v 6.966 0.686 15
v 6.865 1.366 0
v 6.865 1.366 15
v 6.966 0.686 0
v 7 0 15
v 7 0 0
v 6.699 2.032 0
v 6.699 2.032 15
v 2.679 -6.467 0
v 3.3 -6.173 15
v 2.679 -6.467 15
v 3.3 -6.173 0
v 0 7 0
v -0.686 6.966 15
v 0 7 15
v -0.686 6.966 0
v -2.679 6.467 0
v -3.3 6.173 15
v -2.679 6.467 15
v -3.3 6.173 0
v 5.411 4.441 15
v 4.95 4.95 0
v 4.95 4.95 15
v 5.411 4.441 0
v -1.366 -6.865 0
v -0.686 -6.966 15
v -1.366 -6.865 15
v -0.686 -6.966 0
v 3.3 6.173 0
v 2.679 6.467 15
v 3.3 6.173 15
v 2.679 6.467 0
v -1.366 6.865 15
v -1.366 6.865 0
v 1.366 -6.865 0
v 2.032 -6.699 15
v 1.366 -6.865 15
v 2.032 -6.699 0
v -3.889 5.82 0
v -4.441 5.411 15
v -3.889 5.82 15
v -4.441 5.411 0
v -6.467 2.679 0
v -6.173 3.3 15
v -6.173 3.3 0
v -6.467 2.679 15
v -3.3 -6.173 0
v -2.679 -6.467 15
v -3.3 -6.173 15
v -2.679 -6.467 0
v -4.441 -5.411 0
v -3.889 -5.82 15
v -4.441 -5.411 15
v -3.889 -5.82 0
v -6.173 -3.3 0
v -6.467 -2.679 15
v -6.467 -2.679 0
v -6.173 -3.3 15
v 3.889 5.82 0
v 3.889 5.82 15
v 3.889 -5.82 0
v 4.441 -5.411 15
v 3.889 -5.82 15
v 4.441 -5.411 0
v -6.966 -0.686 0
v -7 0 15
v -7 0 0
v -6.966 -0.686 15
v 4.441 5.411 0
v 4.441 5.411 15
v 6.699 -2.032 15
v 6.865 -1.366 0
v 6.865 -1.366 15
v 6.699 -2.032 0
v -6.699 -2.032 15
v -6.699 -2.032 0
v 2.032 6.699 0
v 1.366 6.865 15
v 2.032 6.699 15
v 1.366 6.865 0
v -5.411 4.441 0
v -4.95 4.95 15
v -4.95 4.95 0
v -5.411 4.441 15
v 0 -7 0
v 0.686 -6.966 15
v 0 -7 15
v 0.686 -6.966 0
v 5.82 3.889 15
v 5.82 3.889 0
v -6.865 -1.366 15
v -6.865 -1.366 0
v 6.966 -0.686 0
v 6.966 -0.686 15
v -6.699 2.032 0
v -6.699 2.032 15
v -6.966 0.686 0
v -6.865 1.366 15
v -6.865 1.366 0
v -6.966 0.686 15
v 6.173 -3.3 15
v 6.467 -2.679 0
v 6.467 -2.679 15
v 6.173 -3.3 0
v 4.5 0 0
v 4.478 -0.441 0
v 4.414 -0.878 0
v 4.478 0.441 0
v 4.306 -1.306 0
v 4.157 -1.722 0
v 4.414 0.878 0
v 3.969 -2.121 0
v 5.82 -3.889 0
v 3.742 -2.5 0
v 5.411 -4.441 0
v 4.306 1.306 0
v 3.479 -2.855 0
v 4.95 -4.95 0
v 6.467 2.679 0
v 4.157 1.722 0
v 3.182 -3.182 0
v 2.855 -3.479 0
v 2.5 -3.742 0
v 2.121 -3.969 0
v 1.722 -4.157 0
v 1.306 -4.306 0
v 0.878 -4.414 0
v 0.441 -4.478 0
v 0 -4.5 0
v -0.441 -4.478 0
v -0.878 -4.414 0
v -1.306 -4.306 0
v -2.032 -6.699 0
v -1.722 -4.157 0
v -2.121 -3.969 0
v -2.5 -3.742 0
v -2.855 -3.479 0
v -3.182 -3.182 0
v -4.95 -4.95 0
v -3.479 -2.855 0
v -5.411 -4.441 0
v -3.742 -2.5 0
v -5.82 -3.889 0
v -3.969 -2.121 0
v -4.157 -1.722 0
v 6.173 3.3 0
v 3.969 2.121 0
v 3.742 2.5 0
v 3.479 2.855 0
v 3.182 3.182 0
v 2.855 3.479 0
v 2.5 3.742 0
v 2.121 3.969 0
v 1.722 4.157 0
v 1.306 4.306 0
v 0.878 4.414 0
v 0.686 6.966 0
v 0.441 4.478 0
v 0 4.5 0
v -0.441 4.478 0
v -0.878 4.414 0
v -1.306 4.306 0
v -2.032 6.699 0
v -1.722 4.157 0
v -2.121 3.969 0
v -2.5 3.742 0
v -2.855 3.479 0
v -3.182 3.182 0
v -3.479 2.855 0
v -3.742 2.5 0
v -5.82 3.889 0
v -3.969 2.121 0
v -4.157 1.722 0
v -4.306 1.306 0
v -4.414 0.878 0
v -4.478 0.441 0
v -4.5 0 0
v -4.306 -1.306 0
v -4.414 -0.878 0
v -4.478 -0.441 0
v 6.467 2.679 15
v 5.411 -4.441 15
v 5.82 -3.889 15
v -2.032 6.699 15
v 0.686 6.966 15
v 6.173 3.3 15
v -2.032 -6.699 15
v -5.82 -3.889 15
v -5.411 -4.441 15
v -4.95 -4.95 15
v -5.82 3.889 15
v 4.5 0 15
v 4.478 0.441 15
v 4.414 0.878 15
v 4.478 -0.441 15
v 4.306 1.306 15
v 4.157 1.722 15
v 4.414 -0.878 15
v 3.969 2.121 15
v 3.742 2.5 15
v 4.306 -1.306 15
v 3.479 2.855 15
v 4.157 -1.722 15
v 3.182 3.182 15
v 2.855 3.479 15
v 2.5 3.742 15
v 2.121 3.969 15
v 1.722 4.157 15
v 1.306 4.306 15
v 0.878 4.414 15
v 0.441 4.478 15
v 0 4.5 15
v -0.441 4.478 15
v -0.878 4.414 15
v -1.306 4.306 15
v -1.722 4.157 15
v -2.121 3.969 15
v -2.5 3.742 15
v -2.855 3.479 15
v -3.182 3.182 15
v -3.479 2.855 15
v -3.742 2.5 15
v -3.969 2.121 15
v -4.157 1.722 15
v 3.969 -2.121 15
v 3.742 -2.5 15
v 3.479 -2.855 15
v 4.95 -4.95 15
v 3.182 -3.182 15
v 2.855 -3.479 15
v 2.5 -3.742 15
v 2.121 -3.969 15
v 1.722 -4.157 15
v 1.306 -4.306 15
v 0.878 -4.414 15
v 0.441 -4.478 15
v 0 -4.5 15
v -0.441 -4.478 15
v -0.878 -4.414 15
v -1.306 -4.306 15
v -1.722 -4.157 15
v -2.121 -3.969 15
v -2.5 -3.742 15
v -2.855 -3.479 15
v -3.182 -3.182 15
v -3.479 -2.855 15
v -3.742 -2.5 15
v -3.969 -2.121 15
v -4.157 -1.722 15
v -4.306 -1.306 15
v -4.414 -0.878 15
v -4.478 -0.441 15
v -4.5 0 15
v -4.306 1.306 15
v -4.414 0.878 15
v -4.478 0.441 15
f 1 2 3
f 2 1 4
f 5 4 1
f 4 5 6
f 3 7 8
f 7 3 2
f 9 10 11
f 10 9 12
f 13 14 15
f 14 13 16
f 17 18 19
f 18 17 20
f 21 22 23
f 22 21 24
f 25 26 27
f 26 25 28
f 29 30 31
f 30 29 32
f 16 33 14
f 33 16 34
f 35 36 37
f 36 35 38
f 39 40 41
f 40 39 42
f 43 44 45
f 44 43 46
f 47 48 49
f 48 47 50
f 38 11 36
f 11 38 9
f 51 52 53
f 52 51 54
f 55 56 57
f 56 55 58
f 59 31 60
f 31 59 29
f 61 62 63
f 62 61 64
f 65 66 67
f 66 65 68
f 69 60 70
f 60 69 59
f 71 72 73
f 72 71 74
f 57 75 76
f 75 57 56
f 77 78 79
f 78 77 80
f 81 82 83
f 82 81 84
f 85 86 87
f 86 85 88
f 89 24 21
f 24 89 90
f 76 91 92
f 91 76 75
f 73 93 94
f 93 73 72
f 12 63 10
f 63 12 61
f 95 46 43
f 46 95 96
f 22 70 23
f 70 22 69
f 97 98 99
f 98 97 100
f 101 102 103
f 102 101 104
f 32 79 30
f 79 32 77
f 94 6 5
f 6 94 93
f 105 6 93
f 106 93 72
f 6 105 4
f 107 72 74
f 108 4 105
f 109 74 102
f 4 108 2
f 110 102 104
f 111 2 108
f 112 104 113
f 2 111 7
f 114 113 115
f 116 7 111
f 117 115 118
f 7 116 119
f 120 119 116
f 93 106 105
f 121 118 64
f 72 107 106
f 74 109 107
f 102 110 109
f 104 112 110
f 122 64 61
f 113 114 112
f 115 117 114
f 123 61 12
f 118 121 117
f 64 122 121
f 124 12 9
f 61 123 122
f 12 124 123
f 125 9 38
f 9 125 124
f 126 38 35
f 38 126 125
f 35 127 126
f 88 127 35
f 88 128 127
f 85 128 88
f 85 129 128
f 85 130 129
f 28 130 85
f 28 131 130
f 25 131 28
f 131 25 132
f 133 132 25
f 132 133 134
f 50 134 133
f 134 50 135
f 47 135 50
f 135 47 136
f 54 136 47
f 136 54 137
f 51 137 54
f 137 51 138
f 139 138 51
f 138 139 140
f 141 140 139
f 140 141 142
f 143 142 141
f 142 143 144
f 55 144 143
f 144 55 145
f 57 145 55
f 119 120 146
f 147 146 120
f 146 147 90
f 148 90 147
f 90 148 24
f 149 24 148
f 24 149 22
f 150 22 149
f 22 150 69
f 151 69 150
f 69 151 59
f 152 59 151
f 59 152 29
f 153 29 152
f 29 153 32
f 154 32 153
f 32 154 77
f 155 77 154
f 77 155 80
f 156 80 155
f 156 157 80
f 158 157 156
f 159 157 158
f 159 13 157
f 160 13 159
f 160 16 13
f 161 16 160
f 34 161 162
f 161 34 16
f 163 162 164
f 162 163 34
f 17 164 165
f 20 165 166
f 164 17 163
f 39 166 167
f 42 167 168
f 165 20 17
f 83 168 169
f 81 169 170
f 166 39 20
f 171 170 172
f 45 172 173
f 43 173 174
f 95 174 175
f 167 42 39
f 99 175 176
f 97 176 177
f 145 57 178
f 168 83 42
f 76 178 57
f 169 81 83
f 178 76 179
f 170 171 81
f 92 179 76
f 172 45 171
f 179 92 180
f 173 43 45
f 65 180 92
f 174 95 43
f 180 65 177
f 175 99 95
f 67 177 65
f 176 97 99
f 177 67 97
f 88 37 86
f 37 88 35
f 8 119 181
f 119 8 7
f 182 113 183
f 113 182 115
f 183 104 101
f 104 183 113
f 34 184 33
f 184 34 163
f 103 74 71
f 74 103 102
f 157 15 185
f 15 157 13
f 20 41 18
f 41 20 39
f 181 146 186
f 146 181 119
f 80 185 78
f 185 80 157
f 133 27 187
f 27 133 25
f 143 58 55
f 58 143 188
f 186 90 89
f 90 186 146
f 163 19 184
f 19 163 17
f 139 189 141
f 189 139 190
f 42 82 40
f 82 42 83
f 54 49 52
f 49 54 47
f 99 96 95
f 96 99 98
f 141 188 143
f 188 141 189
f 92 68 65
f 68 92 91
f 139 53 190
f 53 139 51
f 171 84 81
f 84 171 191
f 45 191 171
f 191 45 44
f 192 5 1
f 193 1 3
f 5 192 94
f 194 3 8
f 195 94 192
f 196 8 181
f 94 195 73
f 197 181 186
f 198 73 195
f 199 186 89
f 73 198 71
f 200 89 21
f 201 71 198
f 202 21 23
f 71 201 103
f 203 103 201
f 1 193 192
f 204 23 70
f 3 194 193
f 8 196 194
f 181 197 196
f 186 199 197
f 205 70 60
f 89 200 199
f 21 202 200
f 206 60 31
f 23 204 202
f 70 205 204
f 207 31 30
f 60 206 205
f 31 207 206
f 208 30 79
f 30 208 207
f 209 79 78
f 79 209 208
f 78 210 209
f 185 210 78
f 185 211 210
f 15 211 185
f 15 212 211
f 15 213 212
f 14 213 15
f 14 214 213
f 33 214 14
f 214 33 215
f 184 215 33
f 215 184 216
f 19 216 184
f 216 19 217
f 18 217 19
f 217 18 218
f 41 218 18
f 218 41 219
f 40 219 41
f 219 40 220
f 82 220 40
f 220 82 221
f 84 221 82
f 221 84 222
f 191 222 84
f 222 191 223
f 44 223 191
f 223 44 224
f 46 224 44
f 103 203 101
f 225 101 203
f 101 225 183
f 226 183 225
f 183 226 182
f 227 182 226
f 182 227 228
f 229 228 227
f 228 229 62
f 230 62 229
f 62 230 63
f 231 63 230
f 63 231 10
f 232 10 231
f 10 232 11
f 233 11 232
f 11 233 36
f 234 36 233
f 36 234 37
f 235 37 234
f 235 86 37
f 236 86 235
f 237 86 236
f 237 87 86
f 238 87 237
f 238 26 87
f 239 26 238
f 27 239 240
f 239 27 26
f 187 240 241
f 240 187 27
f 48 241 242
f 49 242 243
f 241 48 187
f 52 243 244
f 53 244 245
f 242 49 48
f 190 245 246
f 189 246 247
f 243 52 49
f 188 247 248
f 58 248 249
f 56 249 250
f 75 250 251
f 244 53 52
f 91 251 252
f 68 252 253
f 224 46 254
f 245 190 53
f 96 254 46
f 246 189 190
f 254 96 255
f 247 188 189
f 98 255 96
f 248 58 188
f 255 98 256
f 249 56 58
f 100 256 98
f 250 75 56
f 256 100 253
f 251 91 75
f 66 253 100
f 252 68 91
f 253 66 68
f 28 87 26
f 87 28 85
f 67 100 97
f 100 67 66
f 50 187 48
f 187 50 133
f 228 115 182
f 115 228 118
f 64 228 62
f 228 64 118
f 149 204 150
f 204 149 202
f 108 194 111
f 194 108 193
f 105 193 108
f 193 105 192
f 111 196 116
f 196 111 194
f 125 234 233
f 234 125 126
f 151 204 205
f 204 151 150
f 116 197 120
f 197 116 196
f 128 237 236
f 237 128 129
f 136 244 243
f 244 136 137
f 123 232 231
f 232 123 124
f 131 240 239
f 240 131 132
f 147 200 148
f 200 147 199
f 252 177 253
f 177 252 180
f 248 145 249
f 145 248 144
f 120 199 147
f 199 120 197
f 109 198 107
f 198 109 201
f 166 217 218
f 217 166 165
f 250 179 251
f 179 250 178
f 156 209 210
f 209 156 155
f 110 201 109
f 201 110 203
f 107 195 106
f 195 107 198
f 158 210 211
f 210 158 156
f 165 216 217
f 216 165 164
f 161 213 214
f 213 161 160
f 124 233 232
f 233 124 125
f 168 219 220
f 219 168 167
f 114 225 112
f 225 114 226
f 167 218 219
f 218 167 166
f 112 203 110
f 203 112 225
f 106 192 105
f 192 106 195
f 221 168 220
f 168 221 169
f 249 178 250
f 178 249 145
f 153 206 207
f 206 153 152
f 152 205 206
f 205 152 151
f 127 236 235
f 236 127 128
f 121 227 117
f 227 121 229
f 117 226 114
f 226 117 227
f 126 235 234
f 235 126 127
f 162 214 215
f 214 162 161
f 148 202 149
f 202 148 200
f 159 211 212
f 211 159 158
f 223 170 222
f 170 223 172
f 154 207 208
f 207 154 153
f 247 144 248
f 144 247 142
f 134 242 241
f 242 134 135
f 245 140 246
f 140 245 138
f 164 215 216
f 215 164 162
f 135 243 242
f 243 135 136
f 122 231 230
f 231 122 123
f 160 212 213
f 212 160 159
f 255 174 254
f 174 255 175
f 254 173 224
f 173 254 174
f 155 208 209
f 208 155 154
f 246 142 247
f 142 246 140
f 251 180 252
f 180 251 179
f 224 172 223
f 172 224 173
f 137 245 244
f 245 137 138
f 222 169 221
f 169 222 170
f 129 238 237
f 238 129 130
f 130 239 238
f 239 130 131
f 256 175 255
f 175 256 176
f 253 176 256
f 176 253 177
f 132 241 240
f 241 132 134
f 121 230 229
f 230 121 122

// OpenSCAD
$fn = 64;

LARGE_HOLE_D = 19;
LARGE_HOLE_R = LARGE_HOLE_D / 2;

LARGE_HOLE_H = 23;

HEAD_D = 15;
HEAD_R = HEAD_D / 2;

PIN_D = 9;
PIN_R = PIN_D / 2;
PIN_H = 30;

INNER_PIN_D = 6;
INNER_PIN_R = INNER_PIN_D / 2;
INNER_PIN_H = 14;

SECTION_D = INNER_PIN_H;
SECTION_R = SECTION_D / 2;

BRIDGE_D = SECTION_D - 3.5;
BRIDGE_R = BRIDGE_D / 2;
BRIDGE_R_IN = BRIDGE_R - 2.5;
BRIDGE_OFF = PIN_R;
BRIDGE_L_IN = 8;
BRIDGE_L = BRIDGE_L_IN + (BRIDGE_OFF * 2);

BASE_D = LARGE_HOLE_D + 3;
BASE_R = BASE_D / 2;
BASE_H_OUT = 3;
BASE_H_IN = 10;
BASE_H_HEAD = 4;


module cil_hole(r_out, r_in, h) {
    translate([0, 0, h/2])
    difference() {
        cylinder(r=r_out, h=h, center=true);
        translate([0, 0, -h]) cylinder(r=r_in, h=h * 4, center=true);
    }
}

module section() {
    cil_hole(r_out = SECTION_R, r_in = INNER_PIN_R, h = INNER_PIN_H);

    translate([BRIDGE_OFF, 0, INNER_PIN_H / 2])
    rotate([0, 90, 0])
        cil_hole(r_out = BRIDGE_R, r_in = BRIDGE_R_IN, h = BRIDGE_L_IN);
    
    translate([BRIDGE_L, 0, INNER_PIN_H / 2])
    rotate([90, 0, 0])
    translate([0, 0, -INNER_PIN_H / 2])
        cil_hole(r_out = SECTION_R, r_in = INNER_PIN_R, h = INNER_PIN_H);
}

module section_1() {
    cil_hole(r_out = SECTION_R, r_in = PIN_R, h = INNER_PIN_H);

    translate([BRIDGE_OFF, 0, INNER_PIN_H / 2])
    rotate([0, 90, 0])
        cil_hole(r_out = BRIDGE_R, r_in = BRIDGE_R_IN, h = BRIDGE_L_IN);
    
    translate([BRIDGE_L, 0, INNER_PIN_H / 2])
    rotate([90, 0, 0])
    translate([0, 0, -INNER_PIN_H / 2])
        cil_hole(r_out = SECTION_R, r_in = PIN_R, h = INNER_PIN_H);
}

module base_out() {
    translate([0, 0, BASE_H_IN])
    rotate([180, 0, 0])
    difference() {
        union() {
            translate([0, 0, BASE_H_OUT/2]) cylinder(r=BASE_R, h=BASE_H_OUT, center=true);
            translate([0, 0, BASE_H_IN/2]) cylinder(r=LARGE_HOLE_R, h=BASE_H_IN, center=true);
        }
        union() {
            cylinder(r=HEAD_R, h=BASE_H_HEAD * 2, center=true);
            cylinder(r=PIN_R, h=PIN_H * 2, center=true);
        }
    }
}

module base_in() {
    difference() {
        union() {
            translate([0, 0, BASE_H_OUT/2]) cylinder(r=BASE_R, h=BASE_H_OUT, center=true);
            translate([0, 0, BASE_H_IN/2]) cylinder(r=LARGE_HOLE_R, h=BASE_H_IN, center=true);
        }
        union() {
            cylinder(r=PIN_R, h=PIN_H * 2, center=true);
        }
    }
}

//module filler_base() {
//    cil_hole(r_out = SECTION_R, r_in = PIN_R, h = PIN_H + BASE_H_IN - (LARGE_HOLE_H + BASE_H_OUT + INNER_PIN_H));
//}

module filler_section() {
    cil_hole(r_out = SECTION_R, r_in = PIN_R, h = 15);
}

//section_1();
//base_out();
//base_in();
//filler_base();
filler_section();
